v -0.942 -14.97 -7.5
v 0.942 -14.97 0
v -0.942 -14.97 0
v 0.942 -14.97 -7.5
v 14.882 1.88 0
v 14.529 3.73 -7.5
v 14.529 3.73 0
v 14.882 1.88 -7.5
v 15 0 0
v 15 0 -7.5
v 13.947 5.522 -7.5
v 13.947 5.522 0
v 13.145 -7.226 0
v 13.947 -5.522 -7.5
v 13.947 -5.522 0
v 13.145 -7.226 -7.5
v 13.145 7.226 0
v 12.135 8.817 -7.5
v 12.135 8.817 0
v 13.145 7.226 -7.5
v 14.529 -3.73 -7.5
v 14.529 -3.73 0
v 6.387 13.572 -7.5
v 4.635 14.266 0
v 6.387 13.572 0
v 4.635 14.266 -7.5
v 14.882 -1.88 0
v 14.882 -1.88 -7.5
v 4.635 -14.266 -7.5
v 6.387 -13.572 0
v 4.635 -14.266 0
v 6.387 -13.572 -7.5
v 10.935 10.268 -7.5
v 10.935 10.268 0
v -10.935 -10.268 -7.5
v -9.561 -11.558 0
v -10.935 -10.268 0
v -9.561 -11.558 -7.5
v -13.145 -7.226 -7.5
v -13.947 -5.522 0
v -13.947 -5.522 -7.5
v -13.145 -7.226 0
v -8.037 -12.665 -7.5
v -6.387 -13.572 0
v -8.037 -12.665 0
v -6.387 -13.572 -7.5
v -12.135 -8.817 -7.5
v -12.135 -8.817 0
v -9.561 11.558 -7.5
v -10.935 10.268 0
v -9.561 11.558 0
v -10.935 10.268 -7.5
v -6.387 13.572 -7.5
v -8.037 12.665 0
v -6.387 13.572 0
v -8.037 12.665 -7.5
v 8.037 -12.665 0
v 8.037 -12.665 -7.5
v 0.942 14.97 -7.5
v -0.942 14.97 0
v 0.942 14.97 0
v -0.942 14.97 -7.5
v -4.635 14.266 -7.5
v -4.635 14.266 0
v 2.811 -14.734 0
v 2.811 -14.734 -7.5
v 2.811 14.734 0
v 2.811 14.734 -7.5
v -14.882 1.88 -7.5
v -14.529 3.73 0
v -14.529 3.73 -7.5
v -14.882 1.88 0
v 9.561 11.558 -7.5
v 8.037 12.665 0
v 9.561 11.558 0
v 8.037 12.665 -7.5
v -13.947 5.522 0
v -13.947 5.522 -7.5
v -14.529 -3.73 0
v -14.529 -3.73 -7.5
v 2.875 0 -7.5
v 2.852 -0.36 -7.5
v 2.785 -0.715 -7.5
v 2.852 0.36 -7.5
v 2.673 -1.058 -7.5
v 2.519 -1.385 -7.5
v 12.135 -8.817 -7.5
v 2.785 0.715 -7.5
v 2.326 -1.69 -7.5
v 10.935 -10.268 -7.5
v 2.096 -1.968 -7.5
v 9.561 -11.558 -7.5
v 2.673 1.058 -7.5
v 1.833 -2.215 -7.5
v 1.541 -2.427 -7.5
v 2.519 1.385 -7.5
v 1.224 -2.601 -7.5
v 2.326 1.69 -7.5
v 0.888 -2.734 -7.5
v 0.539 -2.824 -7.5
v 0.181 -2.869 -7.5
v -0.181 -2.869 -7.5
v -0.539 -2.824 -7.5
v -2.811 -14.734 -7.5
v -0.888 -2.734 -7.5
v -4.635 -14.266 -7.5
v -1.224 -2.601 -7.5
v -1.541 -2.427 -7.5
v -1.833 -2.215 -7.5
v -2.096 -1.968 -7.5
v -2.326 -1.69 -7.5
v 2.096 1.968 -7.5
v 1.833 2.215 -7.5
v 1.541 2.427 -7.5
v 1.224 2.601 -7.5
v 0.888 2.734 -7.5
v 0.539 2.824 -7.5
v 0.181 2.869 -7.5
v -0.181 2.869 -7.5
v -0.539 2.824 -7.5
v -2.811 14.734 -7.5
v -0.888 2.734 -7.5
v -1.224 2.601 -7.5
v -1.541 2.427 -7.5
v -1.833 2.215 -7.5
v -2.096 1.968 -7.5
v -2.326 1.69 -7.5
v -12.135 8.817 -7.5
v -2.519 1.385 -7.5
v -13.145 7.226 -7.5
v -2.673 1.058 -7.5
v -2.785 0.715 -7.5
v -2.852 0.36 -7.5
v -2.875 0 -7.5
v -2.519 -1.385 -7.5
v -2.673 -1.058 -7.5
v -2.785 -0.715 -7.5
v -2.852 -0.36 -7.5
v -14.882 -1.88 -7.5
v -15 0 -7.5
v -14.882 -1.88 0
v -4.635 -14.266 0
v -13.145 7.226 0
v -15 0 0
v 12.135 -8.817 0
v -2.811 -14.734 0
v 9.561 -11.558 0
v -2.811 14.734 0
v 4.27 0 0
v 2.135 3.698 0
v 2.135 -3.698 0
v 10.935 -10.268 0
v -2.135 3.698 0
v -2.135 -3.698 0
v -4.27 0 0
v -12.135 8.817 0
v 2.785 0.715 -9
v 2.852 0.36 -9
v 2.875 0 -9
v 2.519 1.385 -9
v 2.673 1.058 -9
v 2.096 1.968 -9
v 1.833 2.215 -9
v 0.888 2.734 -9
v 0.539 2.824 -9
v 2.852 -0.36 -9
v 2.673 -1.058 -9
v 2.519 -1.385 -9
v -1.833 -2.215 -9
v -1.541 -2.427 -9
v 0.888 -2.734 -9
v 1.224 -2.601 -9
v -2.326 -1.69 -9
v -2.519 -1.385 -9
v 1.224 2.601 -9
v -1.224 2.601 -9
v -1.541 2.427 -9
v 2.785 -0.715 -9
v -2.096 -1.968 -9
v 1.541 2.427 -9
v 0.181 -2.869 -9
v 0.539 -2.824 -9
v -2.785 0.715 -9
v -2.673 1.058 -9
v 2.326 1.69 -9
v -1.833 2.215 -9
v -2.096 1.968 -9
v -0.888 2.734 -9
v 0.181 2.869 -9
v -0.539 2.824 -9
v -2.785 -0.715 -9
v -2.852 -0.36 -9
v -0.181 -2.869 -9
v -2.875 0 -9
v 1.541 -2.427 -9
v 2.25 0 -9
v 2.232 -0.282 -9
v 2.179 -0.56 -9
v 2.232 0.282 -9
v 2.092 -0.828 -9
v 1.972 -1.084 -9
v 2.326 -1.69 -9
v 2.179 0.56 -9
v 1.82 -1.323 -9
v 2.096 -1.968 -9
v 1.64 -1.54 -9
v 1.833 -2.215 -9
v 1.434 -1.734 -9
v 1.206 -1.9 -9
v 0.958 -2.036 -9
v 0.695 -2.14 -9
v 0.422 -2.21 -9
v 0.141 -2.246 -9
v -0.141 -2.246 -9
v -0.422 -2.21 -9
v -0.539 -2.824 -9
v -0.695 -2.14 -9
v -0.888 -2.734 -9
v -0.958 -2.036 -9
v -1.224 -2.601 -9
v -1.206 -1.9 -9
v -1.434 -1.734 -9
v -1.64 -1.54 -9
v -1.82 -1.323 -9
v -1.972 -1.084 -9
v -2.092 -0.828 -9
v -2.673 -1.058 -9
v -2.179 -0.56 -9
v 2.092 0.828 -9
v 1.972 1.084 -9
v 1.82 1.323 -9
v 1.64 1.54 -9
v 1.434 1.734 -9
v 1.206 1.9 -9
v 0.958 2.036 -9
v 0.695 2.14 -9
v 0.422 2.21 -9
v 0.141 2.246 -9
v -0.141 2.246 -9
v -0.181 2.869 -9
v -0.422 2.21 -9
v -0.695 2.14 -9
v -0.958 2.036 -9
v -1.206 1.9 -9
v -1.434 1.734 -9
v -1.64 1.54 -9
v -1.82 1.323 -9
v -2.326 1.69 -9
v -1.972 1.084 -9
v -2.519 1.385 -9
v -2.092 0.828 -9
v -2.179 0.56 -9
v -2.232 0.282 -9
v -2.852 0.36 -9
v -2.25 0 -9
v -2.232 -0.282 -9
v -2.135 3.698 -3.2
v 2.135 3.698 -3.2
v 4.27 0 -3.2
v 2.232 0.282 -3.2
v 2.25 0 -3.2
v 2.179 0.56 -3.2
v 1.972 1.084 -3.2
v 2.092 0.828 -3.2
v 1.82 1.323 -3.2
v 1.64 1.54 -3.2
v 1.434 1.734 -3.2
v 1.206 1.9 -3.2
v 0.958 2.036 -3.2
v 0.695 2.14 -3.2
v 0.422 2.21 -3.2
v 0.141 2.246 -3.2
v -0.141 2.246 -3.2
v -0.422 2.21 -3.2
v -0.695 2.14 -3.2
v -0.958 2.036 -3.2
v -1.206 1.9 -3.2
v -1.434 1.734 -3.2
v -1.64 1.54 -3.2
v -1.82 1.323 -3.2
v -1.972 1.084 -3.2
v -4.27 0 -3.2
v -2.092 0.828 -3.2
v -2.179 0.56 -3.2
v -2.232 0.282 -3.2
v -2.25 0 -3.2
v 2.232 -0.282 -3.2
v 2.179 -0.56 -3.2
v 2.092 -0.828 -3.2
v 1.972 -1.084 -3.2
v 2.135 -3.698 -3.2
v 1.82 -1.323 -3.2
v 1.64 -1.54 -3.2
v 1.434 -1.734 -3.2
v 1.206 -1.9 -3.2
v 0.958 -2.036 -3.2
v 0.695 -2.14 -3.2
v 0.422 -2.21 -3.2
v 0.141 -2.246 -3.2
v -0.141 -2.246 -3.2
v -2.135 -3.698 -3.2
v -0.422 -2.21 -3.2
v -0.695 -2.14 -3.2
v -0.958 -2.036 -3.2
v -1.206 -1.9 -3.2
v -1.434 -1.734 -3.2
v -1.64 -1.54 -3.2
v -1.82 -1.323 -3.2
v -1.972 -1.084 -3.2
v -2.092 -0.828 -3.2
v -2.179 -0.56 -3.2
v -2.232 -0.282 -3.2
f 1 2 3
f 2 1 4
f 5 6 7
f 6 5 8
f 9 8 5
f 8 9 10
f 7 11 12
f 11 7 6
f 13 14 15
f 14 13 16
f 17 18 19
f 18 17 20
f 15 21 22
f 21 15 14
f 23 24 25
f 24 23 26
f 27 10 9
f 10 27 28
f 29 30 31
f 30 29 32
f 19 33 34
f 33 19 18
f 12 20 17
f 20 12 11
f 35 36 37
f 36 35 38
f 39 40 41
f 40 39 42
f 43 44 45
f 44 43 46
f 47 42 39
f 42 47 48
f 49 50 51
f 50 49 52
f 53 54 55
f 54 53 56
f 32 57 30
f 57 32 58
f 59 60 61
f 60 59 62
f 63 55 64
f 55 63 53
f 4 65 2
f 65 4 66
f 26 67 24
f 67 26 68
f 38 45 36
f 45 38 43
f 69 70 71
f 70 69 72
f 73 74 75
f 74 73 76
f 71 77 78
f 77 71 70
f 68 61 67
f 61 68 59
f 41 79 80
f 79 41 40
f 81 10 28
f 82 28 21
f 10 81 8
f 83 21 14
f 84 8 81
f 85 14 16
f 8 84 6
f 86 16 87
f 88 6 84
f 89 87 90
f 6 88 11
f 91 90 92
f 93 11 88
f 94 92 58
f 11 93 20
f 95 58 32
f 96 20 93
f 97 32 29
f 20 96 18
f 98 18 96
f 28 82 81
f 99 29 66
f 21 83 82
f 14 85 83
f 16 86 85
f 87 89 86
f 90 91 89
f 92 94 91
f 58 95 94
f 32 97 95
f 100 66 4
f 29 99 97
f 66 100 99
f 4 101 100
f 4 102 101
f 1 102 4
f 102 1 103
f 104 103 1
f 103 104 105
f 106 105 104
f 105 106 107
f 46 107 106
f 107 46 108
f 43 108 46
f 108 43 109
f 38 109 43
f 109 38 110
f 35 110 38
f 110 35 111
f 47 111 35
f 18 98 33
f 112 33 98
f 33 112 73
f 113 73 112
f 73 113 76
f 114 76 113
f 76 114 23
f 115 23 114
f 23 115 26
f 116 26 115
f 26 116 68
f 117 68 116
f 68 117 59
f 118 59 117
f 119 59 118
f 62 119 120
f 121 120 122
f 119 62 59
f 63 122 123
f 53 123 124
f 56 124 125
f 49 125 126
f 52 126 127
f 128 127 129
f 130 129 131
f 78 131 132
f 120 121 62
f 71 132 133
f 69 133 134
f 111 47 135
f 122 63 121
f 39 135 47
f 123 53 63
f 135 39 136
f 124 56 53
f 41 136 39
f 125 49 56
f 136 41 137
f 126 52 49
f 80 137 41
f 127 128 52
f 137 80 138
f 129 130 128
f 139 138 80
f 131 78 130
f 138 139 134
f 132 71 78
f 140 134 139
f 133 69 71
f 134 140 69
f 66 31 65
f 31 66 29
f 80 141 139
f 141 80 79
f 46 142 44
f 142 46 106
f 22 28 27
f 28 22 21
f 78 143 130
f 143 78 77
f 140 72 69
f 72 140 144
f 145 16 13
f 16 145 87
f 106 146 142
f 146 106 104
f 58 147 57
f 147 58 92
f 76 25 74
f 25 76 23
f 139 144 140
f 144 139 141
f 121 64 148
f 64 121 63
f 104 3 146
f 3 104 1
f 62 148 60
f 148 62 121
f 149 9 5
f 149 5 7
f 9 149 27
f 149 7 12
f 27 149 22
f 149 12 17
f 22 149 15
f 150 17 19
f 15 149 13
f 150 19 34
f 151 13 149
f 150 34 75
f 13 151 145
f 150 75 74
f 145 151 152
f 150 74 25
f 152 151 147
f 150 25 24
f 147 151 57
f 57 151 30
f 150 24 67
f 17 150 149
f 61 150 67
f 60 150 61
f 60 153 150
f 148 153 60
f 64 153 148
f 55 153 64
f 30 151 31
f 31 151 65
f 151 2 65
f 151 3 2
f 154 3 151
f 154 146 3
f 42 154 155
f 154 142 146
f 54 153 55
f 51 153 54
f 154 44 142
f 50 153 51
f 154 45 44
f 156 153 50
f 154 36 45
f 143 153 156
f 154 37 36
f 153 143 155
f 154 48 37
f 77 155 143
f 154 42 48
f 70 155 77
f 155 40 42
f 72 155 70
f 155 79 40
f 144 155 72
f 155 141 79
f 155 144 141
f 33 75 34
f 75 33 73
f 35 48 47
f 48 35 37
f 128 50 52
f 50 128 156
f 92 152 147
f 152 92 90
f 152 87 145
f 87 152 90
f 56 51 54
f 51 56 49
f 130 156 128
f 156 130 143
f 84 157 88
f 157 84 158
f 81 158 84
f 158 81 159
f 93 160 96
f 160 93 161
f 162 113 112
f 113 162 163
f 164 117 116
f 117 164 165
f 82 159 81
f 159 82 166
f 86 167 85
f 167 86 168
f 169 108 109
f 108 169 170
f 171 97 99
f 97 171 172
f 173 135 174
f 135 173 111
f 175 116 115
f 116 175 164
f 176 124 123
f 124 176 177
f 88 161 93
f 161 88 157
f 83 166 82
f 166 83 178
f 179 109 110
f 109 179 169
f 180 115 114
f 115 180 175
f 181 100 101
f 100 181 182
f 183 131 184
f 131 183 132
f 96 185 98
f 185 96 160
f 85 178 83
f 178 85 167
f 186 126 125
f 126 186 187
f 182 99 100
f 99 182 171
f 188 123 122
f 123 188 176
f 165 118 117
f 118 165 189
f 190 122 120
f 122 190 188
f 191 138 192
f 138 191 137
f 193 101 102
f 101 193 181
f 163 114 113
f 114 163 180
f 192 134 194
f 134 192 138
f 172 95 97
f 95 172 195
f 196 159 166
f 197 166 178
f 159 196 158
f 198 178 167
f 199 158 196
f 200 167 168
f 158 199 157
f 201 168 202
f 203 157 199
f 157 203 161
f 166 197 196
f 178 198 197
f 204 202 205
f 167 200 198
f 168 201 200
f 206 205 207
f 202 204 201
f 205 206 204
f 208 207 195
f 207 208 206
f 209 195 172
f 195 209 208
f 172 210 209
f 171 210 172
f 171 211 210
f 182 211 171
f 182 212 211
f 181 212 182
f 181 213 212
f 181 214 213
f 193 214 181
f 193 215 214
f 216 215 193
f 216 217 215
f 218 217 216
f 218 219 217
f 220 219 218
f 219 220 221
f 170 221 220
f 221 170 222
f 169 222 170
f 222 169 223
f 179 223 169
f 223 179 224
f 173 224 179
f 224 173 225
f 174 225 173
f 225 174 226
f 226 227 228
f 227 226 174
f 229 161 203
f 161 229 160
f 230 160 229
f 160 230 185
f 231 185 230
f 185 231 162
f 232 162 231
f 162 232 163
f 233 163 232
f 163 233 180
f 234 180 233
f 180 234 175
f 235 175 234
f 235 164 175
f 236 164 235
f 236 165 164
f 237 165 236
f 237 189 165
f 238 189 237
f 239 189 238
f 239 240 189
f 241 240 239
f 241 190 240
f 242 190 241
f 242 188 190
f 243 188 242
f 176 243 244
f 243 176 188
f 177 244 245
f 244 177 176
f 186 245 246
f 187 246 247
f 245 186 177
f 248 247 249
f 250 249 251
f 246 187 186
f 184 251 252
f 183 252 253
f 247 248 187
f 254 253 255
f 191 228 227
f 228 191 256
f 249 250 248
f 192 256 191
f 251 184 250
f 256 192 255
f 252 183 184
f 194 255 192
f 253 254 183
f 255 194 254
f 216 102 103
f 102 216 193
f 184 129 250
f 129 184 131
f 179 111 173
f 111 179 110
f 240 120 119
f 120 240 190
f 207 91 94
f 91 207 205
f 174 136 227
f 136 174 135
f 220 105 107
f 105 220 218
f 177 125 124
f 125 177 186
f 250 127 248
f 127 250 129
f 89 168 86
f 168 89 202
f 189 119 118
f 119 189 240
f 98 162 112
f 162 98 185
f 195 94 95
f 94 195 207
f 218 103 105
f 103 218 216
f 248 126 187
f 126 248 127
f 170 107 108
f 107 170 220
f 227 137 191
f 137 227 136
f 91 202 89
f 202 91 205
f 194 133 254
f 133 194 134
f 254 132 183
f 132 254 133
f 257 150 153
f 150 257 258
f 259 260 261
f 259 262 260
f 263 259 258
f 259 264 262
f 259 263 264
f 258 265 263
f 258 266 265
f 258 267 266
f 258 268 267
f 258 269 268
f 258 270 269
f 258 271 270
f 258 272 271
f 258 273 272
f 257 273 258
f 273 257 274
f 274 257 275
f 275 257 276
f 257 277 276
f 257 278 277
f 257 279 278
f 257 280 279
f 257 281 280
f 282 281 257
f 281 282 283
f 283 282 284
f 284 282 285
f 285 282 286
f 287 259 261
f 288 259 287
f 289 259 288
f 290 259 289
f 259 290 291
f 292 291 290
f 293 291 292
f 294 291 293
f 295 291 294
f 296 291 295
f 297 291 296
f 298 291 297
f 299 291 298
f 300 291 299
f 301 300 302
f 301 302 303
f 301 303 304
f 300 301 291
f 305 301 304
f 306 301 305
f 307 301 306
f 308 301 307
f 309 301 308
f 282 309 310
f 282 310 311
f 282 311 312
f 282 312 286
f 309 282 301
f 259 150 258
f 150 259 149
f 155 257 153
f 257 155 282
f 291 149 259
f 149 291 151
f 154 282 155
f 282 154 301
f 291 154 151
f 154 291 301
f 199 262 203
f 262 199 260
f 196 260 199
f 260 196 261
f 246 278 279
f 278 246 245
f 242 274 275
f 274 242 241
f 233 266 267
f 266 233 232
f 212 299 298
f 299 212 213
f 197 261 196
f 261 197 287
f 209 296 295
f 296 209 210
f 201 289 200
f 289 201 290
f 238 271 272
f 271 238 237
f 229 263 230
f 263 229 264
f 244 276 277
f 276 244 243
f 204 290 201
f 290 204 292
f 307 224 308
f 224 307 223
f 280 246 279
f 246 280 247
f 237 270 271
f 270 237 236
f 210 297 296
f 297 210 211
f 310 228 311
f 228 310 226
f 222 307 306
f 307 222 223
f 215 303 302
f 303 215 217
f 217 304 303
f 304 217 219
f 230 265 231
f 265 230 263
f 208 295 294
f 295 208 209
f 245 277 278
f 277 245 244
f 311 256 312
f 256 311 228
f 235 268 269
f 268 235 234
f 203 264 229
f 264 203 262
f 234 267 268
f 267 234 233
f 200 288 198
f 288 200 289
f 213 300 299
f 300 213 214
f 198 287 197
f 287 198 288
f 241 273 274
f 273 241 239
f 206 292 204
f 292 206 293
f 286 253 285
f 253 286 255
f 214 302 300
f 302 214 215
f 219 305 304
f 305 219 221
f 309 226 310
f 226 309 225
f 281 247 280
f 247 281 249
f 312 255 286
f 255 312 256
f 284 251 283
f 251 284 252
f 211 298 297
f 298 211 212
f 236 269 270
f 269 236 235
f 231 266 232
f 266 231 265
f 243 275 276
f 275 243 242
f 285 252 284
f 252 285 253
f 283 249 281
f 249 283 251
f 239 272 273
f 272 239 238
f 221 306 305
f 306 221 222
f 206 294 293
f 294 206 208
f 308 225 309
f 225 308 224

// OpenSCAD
$fn = 50;

difference() {
	union() {
		translate(v = [0, 0, -7.5]) {
			cylinder(h = 7.5, r = 15.0);
		}
		#translate(v = [0, 0, -9.0]) {
			cylinder(h = 9, r = 2.875);
		}
	}
	union() {
		translate(v = [0, 0, 0]) {
			rotate(a = [0, 0, 0]) {
				difference() {
					union() {
						translate(v = [0, 0, -3.2]) {
							linear_extrude(height = 3.2) {
								polygon(points = [[4.2698, 0.0], [2.1349000000000005, 3.697755269078796], [-2.134899999999999, 3.6977552690787965], [-4.2698, 5.228996902999369e-16], [-2.134900000000002, -3.6977552690787956], [2.1348999999999974, -3.697755269078798]]);
							}
						}
					}
					union();
				}
			}
		}
		#translate(v = [0, 0, -100.0]) {
			cylinder(h = 200, r = 2.25);
		}
	}
}
